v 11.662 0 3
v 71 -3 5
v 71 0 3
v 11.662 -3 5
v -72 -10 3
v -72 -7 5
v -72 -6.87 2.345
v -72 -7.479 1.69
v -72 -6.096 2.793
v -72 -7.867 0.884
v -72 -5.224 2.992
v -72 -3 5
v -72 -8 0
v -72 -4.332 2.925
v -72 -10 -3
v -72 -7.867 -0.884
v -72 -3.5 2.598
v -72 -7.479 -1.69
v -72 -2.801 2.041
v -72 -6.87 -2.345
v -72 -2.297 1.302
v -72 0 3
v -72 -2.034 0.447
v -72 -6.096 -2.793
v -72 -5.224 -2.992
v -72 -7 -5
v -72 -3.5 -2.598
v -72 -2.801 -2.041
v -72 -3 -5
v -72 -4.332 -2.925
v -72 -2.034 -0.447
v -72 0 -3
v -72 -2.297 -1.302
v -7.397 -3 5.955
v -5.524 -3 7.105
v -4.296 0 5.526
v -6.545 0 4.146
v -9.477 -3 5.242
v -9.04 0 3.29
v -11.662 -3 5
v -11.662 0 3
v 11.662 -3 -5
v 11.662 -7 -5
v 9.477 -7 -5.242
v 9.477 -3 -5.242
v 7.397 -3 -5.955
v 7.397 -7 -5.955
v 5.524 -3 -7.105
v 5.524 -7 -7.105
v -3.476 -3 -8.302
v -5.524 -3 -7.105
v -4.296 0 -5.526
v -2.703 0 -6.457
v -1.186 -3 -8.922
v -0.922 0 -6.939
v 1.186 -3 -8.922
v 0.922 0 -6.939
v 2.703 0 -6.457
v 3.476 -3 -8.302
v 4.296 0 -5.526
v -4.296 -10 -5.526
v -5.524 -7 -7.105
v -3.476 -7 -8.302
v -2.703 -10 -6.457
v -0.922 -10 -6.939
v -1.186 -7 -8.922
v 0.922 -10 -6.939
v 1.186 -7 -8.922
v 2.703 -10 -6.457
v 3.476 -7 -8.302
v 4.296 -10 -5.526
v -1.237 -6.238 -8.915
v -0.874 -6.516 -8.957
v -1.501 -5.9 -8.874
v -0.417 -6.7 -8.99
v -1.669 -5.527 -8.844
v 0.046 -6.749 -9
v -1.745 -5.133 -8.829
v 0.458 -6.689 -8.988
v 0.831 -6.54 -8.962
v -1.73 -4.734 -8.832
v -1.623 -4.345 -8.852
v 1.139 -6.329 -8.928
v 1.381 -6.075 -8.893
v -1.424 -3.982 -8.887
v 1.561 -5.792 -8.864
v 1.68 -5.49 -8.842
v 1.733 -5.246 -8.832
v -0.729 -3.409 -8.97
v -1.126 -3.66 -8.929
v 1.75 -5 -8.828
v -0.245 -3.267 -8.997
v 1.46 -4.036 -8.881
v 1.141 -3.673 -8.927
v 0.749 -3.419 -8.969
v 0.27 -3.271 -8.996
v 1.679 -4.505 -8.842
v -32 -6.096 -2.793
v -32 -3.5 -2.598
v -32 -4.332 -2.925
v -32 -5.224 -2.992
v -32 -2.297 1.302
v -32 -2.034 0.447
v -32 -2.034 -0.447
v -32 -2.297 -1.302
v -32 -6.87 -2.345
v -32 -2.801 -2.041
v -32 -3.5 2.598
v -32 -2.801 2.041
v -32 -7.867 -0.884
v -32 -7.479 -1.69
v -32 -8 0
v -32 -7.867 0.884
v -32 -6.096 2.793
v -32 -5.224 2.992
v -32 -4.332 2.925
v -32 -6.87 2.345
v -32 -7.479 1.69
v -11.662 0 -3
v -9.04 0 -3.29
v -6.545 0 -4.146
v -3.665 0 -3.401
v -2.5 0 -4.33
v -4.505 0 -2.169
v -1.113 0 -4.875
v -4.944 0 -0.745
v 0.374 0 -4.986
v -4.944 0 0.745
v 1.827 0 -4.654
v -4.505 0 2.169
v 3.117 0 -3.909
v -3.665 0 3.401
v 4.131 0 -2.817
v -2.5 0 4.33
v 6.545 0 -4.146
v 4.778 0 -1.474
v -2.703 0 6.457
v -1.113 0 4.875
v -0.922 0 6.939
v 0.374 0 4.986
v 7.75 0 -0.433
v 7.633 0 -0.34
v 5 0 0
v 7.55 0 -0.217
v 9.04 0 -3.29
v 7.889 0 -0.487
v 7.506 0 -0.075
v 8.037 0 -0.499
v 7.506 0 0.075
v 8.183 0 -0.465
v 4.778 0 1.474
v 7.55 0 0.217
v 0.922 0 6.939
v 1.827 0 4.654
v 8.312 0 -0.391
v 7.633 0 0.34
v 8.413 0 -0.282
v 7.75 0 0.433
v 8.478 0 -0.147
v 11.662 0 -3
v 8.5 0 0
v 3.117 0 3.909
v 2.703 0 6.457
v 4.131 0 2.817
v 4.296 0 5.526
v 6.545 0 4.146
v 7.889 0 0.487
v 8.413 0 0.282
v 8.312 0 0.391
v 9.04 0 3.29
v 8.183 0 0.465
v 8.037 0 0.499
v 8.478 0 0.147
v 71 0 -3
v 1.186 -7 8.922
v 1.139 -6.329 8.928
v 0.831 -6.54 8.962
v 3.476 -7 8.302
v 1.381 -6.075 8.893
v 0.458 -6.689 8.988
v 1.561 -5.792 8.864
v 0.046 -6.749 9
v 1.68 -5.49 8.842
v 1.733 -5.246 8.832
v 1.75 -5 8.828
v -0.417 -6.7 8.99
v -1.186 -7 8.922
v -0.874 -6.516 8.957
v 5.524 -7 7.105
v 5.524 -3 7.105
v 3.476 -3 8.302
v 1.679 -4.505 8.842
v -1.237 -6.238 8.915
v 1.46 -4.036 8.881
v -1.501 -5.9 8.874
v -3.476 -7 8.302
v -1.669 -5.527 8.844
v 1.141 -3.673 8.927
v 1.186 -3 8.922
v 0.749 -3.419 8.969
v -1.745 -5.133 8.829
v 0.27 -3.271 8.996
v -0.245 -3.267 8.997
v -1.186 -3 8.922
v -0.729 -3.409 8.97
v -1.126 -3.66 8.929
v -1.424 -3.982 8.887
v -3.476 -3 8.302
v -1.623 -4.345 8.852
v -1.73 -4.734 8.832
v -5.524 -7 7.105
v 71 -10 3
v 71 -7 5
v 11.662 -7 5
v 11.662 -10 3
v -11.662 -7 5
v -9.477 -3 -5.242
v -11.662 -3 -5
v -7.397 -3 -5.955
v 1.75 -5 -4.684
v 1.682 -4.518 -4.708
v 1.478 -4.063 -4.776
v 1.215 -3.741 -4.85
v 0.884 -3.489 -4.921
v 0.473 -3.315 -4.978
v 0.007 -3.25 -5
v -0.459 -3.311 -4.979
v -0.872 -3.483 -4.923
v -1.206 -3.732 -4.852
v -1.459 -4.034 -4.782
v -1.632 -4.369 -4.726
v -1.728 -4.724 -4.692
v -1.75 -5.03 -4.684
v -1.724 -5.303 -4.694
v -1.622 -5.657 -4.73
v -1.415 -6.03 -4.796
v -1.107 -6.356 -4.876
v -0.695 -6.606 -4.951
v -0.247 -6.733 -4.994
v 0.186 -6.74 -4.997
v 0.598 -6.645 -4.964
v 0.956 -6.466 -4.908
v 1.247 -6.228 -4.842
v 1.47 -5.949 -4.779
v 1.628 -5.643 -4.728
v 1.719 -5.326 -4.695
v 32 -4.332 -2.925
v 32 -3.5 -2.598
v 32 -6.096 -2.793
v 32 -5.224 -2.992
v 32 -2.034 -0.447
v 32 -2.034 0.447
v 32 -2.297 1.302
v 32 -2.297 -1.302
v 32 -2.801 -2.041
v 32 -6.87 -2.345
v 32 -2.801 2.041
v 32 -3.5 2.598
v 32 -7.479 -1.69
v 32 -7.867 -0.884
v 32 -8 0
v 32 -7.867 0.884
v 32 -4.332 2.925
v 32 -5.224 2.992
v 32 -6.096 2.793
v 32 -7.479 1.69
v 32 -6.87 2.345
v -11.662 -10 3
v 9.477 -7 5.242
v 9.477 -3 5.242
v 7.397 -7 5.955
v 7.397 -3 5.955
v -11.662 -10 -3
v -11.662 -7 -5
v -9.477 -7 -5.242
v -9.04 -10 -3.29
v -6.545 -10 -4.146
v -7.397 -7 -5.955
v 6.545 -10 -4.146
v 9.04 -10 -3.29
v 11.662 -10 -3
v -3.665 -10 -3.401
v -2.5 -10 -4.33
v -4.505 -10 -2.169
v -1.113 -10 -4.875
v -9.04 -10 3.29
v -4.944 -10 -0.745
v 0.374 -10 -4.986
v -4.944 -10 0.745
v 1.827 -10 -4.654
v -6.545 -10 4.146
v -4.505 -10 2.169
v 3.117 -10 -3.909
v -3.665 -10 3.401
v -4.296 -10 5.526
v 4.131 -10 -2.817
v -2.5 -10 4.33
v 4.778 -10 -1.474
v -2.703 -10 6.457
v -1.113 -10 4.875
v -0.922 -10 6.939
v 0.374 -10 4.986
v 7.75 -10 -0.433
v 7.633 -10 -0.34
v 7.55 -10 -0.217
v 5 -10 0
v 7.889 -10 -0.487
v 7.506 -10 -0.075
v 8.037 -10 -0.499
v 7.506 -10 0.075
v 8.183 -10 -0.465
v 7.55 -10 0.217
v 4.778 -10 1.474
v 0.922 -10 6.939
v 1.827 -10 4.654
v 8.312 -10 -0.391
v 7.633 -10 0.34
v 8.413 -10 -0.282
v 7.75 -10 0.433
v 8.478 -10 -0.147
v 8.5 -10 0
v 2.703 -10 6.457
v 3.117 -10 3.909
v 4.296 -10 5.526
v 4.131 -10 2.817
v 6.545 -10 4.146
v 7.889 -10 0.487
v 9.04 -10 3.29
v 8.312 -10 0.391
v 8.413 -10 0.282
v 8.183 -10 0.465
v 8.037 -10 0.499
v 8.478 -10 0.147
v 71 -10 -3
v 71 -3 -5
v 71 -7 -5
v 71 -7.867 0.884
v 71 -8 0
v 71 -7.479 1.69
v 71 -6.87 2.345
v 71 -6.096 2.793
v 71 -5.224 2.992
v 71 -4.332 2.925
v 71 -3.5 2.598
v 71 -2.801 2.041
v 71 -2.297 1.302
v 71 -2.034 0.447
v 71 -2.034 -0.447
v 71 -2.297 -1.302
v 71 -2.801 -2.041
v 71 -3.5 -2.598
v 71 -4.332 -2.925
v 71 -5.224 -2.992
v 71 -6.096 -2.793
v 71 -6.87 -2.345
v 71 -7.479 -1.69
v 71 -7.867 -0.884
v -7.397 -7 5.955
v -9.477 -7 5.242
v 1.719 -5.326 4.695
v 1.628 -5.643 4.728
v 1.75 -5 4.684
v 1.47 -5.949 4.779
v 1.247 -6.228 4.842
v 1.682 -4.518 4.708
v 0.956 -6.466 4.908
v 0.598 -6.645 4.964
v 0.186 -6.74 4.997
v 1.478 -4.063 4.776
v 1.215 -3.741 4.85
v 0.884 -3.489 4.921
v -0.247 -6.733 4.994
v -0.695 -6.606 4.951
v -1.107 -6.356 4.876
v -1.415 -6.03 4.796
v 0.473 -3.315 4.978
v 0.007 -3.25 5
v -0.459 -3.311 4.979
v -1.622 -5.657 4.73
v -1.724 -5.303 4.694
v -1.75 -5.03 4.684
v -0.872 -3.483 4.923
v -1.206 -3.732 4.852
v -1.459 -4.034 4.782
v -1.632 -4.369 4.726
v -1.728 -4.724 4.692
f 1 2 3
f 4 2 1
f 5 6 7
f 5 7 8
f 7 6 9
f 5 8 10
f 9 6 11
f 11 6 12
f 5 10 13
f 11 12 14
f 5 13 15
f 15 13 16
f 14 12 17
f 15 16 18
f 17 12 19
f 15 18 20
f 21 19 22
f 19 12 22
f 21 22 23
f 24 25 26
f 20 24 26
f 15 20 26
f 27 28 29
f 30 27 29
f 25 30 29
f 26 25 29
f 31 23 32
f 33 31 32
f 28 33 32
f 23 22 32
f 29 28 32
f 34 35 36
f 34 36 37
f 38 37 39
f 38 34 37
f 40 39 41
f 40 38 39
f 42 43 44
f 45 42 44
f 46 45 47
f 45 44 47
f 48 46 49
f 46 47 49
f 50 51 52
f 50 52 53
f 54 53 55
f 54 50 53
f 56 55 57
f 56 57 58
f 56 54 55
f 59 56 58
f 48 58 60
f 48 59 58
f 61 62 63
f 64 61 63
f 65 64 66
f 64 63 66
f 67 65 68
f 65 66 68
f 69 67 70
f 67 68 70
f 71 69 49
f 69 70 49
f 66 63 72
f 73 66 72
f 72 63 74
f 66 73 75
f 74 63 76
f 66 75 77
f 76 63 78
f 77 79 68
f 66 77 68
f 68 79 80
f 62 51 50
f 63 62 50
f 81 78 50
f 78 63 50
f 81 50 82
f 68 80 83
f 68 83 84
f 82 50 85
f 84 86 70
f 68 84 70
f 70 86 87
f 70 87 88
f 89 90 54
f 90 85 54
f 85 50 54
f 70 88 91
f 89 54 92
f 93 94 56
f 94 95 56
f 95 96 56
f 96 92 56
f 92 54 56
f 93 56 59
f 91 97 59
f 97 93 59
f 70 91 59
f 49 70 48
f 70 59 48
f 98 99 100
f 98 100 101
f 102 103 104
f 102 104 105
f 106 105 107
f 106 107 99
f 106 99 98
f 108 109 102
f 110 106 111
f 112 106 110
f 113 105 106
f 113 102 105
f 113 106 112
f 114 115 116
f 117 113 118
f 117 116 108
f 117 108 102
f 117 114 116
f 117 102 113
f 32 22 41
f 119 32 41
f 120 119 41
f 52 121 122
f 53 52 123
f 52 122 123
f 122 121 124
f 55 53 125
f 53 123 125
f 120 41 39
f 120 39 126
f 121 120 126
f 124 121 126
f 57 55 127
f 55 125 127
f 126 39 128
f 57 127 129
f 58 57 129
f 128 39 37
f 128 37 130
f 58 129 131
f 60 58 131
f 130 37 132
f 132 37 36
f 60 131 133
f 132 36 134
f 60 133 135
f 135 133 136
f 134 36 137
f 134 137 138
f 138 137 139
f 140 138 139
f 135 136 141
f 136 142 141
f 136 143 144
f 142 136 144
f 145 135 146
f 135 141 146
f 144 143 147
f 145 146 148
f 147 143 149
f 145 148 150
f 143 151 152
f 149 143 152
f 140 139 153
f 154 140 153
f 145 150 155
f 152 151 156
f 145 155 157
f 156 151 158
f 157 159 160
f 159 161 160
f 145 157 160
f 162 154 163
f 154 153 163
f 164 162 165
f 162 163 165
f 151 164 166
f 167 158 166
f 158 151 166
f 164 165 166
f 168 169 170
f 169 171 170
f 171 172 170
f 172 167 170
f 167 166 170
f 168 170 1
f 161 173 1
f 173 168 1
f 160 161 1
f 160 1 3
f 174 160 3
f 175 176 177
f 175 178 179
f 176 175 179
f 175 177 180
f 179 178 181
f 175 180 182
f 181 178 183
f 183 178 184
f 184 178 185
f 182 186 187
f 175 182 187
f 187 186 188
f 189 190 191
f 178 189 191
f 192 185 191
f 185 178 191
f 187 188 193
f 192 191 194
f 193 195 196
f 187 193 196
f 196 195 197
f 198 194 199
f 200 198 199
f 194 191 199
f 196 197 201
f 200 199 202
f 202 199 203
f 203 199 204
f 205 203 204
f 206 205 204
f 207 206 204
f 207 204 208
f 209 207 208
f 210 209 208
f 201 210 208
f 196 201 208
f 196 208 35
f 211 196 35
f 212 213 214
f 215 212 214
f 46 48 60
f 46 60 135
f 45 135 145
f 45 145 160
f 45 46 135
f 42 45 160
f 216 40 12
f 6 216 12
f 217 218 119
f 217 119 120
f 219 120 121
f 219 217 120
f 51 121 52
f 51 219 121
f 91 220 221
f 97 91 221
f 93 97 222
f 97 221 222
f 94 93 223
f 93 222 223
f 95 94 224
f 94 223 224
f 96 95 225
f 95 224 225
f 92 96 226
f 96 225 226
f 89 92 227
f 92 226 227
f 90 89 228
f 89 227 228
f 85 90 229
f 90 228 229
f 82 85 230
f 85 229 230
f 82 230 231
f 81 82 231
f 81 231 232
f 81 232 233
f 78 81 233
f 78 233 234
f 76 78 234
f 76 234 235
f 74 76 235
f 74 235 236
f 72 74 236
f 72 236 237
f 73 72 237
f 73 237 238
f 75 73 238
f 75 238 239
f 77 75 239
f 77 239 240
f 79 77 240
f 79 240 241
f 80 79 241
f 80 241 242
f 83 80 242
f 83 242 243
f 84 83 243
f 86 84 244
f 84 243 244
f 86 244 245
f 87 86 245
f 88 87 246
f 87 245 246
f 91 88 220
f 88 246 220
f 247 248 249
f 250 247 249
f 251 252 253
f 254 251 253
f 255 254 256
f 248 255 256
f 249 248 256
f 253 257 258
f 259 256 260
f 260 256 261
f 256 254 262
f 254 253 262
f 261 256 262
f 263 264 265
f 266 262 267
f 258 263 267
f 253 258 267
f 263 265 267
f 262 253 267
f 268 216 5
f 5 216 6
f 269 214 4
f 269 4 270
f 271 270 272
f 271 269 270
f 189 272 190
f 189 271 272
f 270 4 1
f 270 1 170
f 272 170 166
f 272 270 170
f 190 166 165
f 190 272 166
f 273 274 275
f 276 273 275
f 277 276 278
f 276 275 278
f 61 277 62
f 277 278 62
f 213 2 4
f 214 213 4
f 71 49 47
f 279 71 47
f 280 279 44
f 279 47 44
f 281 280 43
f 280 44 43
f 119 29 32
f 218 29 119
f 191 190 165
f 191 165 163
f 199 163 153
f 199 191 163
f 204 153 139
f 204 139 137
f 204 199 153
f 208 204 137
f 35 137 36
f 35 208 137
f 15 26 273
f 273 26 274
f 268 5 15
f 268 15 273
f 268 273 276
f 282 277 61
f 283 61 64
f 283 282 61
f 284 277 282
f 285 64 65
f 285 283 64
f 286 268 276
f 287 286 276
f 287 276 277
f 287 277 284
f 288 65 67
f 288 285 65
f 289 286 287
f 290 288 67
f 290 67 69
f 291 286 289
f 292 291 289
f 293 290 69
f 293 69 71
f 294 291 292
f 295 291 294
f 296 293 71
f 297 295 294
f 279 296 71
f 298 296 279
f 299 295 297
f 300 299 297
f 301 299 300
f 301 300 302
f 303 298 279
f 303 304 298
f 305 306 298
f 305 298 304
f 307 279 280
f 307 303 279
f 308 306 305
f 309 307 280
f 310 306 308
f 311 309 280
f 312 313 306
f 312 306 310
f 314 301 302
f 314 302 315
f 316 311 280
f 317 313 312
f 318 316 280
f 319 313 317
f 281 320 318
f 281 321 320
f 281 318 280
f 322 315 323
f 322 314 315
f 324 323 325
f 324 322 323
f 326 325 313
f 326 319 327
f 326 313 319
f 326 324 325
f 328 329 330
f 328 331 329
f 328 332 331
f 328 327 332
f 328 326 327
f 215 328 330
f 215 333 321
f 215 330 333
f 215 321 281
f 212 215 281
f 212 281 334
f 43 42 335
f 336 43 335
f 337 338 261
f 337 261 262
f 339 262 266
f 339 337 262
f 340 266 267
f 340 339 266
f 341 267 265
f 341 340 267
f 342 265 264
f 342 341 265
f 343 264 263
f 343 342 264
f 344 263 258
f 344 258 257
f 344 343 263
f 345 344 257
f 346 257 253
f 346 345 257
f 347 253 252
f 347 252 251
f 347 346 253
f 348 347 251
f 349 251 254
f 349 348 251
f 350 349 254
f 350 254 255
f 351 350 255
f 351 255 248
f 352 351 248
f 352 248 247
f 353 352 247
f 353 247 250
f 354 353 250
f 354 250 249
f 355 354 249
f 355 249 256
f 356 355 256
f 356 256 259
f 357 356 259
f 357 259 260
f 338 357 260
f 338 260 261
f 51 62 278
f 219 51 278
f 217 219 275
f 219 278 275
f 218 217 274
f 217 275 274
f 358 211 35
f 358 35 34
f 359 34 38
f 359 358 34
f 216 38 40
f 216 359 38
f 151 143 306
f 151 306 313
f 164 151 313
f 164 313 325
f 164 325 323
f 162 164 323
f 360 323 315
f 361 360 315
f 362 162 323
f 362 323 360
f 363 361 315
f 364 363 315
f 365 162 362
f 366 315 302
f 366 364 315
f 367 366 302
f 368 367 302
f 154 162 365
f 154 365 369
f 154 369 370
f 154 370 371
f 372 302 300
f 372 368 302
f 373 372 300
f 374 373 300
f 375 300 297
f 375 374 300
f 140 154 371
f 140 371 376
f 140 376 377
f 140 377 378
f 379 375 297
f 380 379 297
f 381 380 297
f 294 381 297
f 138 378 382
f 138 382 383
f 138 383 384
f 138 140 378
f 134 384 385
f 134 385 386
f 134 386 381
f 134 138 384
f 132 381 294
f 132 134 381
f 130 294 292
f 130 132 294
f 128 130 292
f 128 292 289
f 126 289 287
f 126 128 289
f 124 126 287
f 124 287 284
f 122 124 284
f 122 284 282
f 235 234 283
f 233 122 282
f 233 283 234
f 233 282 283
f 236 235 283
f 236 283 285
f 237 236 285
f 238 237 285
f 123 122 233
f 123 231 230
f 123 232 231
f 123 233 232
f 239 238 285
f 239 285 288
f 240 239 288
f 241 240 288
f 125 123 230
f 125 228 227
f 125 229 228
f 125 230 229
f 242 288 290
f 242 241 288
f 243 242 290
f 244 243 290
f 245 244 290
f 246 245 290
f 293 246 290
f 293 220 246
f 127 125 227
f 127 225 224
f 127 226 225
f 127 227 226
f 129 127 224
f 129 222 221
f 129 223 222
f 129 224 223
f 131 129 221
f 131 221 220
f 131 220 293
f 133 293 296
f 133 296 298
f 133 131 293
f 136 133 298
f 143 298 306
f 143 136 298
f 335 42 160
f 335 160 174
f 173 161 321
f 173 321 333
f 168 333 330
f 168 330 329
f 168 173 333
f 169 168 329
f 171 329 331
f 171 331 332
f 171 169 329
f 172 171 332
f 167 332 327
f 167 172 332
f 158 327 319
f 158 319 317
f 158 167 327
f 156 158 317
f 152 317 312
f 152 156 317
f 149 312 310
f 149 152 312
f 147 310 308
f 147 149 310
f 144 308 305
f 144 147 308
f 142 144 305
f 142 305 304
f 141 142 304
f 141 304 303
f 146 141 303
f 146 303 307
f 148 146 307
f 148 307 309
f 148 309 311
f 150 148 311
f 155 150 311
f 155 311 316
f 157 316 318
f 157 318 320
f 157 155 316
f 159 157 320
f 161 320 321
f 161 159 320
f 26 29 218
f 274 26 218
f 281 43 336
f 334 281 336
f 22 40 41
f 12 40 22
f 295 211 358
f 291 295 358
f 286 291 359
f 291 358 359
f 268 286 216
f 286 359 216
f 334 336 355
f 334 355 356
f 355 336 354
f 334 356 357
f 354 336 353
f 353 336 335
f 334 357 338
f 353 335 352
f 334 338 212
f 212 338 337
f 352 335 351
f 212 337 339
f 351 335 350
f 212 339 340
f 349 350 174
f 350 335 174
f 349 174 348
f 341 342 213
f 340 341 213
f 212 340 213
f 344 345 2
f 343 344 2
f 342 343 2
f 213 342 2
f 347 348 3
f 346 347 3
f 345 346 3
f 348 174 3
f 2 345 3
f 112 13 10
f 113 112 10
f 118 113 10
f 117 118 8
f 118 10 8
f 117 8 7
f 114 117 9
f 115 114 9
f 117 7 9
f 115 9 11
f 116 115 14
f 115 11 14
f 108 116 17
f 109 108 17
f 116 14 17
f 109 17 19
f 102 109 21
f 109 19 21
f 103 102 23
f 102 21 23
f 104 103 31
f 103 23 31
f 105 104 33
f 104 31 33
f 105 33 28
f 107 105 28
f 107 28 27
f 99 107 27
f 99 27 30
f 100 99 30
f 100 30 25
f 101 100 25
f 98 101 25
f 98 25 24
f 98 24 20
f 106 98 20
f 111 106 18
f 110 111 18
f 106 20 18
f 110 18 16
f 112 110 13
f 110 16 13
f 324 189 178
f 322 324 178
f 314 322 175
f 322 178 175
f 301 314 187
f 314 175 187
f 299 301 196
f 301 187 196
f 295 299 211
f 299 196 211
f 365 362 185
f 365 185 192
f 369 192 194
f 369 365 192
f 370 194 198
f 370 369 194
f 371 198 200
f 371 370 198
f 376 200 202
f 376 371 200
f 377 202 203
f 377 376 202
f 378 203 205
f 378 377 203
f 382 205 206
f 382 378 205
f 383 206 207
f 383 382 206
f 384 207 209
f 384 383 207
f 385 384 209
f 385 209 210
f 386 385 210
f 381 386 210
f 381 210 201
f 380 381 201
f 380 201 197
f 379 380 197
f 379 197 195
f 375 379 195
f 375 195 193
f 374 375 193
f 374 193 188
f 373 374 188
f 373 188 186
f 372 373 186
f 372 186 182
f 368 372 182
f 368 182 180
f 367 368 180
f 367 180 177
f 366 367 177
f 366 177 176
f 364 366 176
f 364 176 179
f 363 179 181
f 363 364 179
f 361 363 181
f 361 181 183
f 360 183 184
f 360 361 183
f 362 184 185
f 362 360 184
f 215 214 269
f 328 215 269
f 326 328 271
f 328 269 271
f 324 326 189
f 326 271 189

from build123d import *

# Parameters (mm, degrees)
F0_R          = 5
F0_R_2        = 0.5
F1_DEPTH      = 10
F2_R          = 3
F3_DEPTH      = 40
F4_R          = 1.75
F5_DEPTH      = 9.001
F5_DEPTH_BACK = 9.001
F6_R          = 10
F7_SIZE2      = 3
F7_SIZE       = 2
F7_2_SIZE2    = 3
F7_2_SIZE     = 2


# Not quite as in the source:
# - a pattern or mirror of a feature is missing from the dataset's text; its kind, count and spacing are read off the source's solid


with BuildPart() as f1:
    # F0 (on Front) → F1 (new body)
    with BuildSketch(Plane.XZ):
        with BuildLine():
            Line((71, 5), (7.4833147735, 5))
            ThreePointArc((7.4833147735, 5), (0, 9), (-7.4833147735, 5))
            Line((-7.4833147735, 5), (-72, 5))
            Line((-72, 5), (-72, -5))
            Line((-72, -5), (-7.4833147735, -5))
            ThreePointArc((-7.4833147735, -5), (0, -9), (7.4833147735, -5))
            Line((7.4833147735, -5), (71, -5))
            Line((71, -5), (71, 5))
        make_face()
        Circle(F0_R, mode=Mode.SUBTRACT)
        with Locations((8, 0)):
            Circle(F0_R_2, mode=Mode.SUBTRACT)
    extrude(amount=F1_DEPTH)

    # F2 (on face) → F3 (cut)
    with BuildSketch(Plane(origin=(-72, 0, 0), x_dir=(0, -1, 0), z_dir=(-1, 0, 0))):
        with Locations((5, 0)):
            Circle(F2_R)
    f3 = extrude(amount=-F3_DEPTH, mode=Mode.SUBTRACT)

    # F3_copies: F3 across plane
    add(f3.mirror(Plane(origin=(0, 0, 0), x_dir=(0, 0, 1), z_dir=(1, 0, 0))), mode=Mode.SUBTRACT)

    # F4 (on Top) → F5 (cut, two sides)
    with BuildSketch(Plane.XY) as f5_sk:
        with Locations((0, -5)):
            Circle(F4_R)
    extrude(amount=-F5_DEPTH, mode=Mode.SUBTRACT)
    extrude(f5_sk.sketch, amount=F5_DEPTH_BACK, mode=Mode.SUBTRACT)

    # F6
    f6_edges = [f1.edges().sort_by_distance(p)[0] for p in [
        (-7.483315, -5, 5),
        (7.483315, -5, 5),
        (7.483315, -5, -5),
        (-7.483315, -5, -5),
    ]]
    fillet(f6_edges, radius=F6_R)

    # F7
    f7_edges = [f1.edges().sort_by_distance(p)[0] for p in [
        (-41.830952, -10, 5),
        (-41.830952, -10, -5),
    ]]
    f7_side = f1.faces().sort_by_distance((41.330952, -10, -3.558716))[0]
    chamfer(f7_edges, length=F7_SIZE, length2=F7_SIZE2, reference=f7_side)

    # F7#2
    f7_2_edges = [f1.edges().sort_by_distance(p)[0] for p in [
        (-41.830952, 0, 5),
        (-41.830952, 0, -5),
    ]]
    f7_2_side = f1.faces().sort_by_distance((41.330952, 0, -3.558716))[0]
    chamfer(f7_2_edges, length=F7_2_SIZE, length2=F7_2_SIZE2, reference=f7_2_side)


solid = f1.part
